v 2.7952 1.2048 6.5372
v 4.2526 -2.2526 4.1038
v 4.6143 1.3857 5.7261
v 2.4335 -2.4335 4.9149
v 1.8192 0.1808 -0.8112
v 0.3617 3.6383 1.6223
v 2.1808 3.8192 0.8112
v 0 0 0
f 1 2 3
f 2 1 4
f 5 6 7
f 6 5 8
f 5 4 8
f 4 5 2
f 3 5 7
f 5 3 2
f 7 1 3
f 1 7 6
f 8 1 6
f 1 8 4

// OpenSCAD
// Axis-angle with a non-cardinal axis — exercises the Rodrigues
// matrix path, not just the Euler shortcut.
rotate(35, [1, 1, 0]) cube([2, 4, 6]);
